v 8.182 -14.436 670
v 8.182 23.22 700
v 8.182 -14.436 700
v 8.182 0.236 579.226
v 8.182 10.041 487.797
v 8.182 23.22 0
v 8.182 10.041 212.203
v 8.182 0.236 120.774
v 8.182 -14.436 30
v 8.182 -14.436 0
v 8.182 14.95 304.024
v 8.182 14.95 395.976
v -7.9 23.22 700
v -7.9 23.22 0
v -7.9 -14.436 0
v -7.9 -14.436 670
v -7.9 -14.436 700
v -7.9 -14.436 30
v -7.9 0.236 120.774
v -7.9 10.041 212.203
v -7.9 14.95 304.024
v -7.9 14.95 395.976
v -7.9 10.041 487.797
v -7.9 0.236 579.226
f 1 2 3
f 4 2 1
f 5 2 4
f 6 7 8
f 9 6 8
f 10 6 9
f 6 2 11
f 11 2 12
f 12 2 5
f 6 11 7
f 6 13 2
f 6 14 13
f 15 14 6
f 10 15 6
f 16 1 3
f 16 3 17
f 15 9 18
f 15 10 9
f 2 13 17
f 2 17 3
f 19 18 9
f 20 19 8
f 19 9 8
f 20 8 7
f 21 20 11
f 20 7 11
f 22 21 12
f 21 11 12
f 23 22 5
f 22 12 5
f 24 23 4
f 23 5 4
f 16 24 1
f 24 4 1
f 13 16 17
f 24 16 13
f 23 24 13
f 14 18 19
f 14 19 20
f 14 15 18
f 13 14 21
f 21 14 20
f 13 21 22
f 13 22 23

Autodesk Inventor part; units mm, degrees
ref_plane "YZ Plane" through (0, 0, 0) normal (1, 0, 0) x (0, 1, 0)
ref_plane "XZ Plane" through (0, 0, 0) normal (0, 1, 0) x (-1, 0, 0)
ref_plane "XY Plane" through (0, 0, 0) normal (0, 0, 1) x (1, 0, 0)
sketch "Sketch1" plane through (0, 0, 0) normal (0, 0, 1) x (1, 0, 0)
  line L0 (-7.8997, 15.5643) -> (8.1818, 15.5643)
  line L1 (8.1818, 15.5643) -> (8.1818, -14.4357)
  line L2 (8.1818, -14.4357) -> (-7.8997, -14.4357)
  line L3 (-7.8997, -14.4357) -> (-7.8997, 15.5643)
  line L4 (8.1818, 15.5643) -> (-7.8997, 15.5643)
  line L5 (-7.8997, 15.5643) -> (-7.8997, 23.2199)
  line L6 (-7.8997, 23.2199) -> (8.1818, 23.2199)
  line L7 (8.1818, 23.2199) -> (8.1818, 15.5643)
  point P0 (0, 0)
  dimension "d6" = 30
extrude "Extrusion1" add sketch "Sketch1" along normal blind 700 contours L0 L1 L2 L3
sketch "Sketch2" plane through (8.1818, -14.4357, 0) normal (1, 0, 0) x (0, 0, -1)
  line L0 (0, 0) -> (-700, 0) projected
  arc A0 (-30, 0) -> (-670, 0) centre (-350, -1691.6667) ccw
  line L1 (-30, 0) -> (-670, 0)
  line L2 (0, 30) -> (-700, 30) projected
  point P0 (0, 14.4357)
  dimension "d4" = 30
  dimension "d5" = 30
extrude "Extrusion2" cut sketch "Sketch2" against normal blind 90000
sketch "Sketch3" plane through (0, 0, 0) normal (0, 0, -1) x (-1, 0, 0)
  point P0 (0, 0)
extrude "Extrusion3" add sketch "Sketch1" along normal up to surface (700 mm away) contours L5 L6 L7 L0
equation "\"d5\" = d4"
properties part number "Group Bridge"
